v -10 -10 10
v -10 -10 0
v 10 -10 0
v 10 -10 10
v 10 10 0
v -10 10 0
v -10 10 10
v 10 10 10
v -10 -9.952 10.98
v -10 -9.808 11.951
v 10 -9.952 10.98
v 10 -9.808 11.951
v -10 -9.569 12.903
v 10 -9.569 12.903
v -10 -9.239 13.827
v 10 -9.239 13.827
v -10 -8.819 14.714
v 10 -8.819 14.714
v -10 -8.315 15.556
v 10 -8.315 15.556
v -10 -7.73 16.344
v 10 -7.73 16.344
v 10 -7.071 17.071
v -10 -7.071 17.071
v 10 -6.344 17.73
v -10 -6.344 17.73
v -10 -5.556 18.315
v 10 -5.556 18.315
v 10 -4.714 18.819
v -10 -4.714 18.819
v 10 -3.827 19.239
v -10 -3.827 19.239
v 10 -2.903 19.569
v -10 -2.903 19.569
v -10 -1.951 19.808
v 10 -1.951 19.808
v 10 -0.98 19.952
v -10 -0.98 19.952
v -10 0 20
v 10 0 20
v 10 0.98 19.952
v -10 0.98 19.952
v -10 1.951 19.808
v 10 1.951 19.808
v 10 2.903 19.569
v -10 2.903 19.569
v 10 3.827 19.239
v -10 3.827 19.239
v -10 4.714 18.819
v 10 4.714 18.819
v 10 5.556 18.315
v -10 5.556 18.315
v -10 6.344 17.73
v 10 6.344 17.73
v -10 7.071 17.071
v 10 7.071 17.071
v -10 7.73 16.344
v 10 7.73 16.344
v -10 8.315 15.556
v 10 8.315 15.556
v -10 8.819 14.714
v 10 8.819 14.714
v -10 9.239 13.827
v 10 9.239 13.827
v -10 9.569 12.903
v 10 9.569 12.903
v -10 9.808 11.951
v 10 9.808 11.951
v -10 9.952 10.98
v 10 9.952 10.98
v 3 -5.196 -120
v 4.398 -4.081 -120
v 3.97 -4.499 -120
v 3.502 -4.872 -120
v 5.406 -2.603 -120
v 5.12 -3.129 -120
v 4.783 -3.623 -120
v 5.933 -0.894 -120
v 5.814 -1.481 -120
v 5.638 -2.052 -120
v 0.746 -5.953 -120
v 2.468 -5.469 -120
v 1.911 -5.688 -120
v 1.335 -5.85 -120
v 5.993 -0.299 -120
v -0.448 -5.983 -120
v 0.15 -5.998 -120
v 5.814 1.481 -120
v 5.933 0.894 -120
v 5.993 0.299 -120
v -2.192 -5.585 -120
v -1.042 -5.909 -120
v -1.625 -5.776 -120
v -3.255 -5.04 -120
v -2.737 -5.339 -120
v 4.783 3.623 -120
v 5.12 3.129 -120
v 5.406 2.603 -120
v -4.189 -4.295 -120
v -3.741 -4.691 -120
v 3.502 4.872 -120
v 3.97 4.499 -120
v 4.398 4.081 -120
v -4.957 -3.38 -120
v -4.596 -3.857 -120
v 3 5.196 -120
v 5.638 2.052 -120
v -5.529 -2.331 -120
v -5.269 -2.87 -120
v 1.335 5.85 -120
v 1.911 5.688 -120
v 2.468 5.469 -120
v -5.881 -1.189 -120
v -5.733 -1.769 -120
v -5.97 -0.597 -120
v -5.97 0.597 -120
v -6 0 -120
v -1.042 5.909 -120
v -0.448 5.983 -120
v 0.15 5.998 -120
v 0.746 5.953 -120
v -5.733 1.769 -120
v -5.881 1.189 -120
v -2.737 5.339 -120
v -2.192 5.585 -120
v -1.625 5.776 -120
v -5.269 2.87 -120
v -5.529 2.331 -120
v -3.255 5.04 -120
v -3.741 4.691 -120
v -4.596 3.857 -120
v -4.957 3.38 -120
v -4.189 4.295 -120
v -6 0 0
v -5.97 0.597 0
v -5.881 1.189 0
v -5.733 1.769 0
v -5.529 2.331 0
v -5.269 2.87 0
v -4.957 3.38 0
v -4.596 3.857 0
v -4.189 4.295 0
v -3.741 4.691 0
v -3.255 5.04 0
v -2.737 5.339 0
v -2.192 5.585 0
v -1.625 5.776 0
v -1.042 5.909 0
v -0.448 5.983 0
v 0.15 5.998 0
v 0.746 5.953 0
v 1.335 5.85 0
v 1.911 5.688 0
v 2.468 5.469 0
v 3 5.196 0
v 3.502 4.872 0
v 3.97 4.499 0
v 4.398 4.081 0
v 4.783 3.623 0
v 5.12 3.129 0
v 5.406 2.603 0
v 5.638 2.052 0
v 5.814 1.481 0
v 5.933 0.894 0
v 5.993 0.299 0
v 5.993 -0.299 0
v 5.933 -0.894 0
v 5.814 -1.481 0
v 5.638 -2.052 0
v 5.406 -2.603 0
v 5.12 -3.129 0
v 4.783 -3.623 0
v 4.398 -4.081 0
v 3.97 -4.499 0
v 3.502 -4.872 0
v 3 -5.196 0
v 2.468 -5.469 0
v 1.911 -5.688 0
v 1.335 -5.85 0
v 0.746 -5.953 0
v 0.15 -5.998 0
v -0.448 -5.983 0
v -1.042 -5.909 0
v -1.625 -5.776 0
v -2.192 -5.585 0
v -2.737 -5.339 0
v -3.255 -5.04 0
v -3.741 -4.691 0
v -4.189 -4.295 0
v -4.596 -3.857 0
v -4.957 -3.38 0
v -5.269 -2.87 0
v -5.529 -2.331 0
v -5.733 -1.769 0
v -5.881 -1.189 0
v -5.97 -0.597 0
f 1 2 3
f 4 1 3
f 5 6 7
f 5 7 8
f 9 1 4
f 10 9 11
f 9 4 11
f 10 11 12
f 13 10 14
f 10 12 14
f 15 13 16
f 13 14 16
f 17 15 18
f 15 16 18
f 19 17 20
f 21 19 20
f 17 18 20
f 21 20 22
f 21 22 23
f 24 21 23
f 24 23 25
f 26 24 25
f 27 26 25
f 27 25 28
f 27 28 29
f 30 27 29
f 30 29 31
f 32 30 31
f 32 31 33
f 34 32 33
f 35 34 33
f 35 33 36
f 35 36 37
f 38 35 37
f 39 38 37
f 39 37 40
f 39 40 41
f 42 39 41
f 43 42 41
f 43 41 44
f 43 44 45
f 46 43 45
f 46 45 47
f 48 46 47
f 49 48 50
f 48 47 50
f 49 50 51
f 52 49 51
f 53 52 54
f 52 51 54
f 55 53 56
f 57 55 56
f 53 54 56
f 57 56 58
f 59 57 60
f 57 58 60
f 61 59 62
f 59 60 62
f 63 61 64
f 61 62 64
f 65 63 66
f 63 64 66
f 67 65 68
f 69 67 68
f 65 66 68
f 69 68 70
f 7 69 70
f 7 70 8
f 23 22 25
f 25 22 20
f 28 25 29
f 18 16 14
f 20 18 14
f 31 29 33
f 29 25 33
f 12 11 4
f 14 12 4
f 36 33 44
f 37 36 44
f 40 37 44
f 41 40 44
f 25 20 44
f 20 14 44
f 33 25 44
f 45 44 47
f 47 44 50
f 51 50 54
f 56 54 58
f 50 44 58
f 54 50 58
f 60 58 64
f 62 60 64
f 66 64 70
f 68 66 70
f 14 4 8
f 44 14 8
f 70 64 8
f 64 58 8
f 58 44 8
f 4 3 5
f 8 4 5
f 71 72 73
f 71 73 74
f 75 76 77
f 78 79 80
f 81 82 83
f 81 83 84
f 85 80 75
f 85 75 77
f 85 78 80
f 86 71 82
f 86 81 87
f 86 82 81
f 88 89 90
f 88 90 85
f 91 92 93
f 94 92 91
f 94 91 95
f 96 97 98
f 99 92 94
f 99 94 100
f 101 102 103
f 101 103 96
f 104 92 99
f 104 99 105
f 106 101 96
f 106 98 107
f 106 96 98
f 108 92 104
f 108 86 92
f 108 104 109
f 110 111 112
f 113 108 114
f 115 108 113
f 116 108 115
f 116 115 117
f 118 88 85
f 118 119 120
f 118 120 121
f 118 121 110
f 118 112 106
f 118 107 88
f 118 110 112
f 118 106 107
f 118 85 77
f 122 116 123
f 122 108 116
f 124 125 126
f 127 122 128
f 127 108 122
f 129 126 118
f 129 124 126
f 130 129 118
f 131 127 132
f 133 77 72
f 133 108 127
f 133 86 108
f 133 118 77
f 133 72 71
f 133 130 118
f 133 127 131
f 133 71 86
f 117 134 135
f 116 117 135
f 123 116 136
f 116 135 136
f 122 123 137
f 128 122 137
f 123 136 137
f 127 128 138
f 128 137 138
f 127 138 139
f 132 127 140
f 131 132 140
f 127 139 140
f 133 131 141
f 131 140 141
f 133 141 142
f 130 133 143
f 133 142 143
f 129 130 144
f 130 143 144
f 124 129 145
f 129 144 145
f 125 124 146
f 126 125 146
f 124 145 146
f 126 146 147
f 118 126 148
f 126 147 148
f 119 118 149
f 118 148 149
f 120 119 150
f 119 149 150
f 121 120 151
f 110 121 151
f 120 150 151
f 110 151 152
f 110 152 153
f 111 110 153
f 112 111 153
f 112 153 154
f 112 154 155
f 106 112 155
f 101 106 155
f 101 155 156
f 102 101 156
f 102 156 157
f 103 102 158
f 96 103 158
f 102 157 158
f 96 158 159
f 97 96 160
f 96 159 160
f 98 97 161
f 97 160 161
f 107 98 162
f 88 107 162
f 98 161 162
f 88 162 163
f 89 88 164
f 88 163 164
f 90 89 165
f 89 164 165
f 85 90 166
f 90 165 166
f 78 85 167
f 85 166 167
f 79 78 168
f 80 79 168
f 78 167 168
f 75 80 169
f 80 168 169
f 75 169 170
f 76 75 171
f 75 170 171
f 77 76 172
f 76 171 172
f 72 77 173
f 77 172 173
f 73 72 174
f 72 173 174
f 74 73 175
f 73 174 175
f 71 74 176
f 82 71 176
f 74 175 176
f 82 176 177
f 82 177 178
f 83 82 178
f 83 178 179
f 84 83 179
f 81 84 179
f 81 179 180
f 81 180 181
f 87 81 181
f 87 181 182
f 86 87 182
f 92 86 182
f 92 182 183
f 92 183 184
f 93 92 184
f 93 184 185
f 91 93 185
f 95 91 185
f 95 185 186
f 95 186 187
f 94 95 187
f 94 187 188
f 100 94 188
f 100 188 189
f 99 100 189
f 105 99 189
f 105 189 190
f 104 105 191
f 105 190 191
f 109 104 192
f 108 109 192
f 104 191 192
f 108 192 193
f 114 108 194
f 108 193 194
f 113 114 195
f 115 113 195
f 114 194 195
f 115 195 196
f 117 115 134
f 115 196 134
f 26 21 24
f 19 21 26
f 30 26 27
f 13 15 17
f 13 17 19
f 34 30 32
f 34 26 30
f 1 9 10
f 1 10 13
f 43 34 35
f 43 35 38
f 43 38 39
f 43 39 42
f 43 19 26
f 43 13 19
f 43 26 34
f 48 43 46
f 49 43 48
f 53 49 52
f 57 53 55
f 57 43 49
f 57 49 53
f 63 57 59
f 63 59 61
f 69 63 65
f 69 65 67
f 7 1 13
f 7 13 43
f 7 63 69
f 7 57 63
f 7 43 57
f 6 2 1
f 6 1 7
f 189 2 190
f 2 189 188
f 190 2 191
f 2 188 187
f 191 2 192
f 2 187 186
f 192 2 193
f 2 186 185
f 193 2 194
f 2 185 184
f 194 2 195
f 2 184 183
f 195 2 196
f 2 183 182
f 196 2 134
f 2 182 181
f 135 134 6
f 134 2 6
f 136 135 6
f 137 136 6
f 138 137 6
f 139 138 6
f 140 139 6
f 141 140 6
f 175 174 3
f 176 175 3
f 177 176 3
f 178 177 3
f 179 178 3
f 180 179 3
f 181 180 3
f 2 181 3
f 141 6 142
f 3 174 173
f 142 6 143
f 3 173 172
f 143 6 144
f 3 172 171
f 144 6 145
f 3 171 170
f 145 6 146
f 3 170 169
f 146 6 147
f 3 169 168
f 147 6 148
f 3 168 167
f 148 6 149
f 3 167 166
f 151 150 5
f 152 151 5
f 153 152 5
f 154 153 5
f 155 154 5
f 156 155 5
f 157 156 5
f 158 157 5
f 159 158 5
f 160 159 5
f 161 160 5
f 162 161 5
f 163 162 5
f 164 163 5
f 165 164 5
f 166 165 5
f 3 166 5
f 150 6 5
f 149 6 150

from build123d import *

# Parameters (mm, degrees)
SKETCH_1_W          = 20
SKETCH_1_H          = 20
EXTRUDE_1_DEPTH     = 20
SKETCH_2_R          = 6
EXTRUDE_2_DEPTH     = 120
CUT_EXTRUDE_1_DEPTH = 70


with BuildPart() as part:
    # 草图1 → 凸台-拉伸1 (new body)
    with BuildSketch(Plane.XY):
        Rectangle(SKETCH_1_W, SKETCH_1_H)
    extrude(amount=EXTRUDE_1_DEPTH)

    # 草图2 → 凸台-拉伸2 (add)
    with BuildSketch(Plane(origin=(0, 0, 0), x_dir=(-1, 0, 0), z_dir=(0, 0, -1))):
        Circle(SKETCH_2_R)
    extrude(amount=EXTRUDE_2_DEPTH)

    # 草图3 → 切除-拉伸1 (cut)
    with BuildSketch(Plane(origin=(10, 0, 0), x_dir=(0, 0, -1), z_dir=(1, 0, 0))):
        with BuildLine():
            Line((-10, 10), (-23.053143475, 10))
            Line((-23.053143475, 10), (-23.053143475, -10))
            Line((-23.053143475, -10), (-10, -10))
            ThreePointArc((-10, -10), (-20, 0), (-10, 10))
        make_face()
    extrude(amount=-CUT_EXTRUDE_1_DEPTH, mode=Mode.SUBTRACT)


solid = part.part
